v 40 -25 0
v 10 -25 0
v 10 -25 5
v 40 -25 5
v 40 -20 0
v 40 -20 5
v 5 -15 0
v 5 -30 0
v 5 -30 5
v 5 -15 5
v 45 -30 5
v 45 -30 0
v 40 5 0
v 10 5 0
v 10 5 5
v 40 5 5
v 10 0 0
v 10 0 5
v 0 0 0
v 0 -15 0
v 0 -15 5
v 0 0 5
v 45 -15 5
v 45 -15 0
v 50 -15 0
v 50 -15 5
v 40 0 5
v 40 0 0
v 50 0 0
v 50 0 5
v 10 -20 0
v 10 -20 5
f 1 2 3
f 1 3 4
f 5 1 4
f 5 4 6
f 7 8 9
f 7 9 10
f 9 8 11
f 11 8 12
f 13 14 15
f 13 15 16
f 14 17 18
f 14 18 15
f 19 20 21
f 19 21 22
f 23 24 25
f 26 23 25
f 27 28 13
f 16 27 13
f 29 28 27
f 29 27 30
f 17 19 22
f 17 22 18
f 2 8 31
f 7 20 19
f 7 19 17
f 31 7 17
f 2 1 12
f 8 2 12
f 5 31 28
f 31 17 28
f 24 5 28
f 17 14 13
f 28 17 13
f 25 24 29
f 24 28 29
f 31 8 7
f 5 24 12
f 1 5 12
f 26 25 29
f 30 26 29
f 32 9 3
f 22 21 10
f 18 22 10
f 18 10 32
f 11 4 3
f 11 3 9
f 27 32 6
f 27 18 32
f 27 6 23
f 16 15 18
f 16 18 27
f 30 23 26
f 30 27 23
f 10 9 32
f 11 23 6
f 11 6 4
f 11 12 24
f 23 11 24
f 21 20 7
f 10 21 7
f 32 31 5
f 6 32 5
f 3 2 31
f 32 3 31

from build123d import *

# Parameters (mm, degrees)
SKETCH1_W           = 30
SKETCH1_H           = 5
SKETCH1_W_2         = 50
SKETCH1_H_2         = 15
SKETCH1_W_3         = 40
BOSS_EXTRUDE1_DEPTH = 5


with BuildPart() as part:
    # Sketch1 → Boss-Extrude1 (new body)
    # profile 1 of 3: a face of its own
    with BuildSketch(Plane.XY):
        with Locations((25, 2.5)):
            Rectangle(SKETCH1_W, SKETCH1_H)
    # profile 2 of 3: a face of its own
    with BuildSketch(Plane.XY):
        with Locations((25, -7.5)):
            Rectangle(SKETCH1_W_2, SKETCH1_H_2)
    # profile 3 of 3: a face of its own
    with BuildSketch(Plane.XY):
        with Locations((25, -22.5)):
            Rectangle(SKETCH1_W_3, SKETCH1_H_2)
        with Locations((25, -22.5)):
            Rectangle(SKETCH1_W, SKETCH1_H, mode=Mode.SUBTRACT)
    extrude(amount=BOSS_EXTRUDE1_DEPTH)


solid = part.part
